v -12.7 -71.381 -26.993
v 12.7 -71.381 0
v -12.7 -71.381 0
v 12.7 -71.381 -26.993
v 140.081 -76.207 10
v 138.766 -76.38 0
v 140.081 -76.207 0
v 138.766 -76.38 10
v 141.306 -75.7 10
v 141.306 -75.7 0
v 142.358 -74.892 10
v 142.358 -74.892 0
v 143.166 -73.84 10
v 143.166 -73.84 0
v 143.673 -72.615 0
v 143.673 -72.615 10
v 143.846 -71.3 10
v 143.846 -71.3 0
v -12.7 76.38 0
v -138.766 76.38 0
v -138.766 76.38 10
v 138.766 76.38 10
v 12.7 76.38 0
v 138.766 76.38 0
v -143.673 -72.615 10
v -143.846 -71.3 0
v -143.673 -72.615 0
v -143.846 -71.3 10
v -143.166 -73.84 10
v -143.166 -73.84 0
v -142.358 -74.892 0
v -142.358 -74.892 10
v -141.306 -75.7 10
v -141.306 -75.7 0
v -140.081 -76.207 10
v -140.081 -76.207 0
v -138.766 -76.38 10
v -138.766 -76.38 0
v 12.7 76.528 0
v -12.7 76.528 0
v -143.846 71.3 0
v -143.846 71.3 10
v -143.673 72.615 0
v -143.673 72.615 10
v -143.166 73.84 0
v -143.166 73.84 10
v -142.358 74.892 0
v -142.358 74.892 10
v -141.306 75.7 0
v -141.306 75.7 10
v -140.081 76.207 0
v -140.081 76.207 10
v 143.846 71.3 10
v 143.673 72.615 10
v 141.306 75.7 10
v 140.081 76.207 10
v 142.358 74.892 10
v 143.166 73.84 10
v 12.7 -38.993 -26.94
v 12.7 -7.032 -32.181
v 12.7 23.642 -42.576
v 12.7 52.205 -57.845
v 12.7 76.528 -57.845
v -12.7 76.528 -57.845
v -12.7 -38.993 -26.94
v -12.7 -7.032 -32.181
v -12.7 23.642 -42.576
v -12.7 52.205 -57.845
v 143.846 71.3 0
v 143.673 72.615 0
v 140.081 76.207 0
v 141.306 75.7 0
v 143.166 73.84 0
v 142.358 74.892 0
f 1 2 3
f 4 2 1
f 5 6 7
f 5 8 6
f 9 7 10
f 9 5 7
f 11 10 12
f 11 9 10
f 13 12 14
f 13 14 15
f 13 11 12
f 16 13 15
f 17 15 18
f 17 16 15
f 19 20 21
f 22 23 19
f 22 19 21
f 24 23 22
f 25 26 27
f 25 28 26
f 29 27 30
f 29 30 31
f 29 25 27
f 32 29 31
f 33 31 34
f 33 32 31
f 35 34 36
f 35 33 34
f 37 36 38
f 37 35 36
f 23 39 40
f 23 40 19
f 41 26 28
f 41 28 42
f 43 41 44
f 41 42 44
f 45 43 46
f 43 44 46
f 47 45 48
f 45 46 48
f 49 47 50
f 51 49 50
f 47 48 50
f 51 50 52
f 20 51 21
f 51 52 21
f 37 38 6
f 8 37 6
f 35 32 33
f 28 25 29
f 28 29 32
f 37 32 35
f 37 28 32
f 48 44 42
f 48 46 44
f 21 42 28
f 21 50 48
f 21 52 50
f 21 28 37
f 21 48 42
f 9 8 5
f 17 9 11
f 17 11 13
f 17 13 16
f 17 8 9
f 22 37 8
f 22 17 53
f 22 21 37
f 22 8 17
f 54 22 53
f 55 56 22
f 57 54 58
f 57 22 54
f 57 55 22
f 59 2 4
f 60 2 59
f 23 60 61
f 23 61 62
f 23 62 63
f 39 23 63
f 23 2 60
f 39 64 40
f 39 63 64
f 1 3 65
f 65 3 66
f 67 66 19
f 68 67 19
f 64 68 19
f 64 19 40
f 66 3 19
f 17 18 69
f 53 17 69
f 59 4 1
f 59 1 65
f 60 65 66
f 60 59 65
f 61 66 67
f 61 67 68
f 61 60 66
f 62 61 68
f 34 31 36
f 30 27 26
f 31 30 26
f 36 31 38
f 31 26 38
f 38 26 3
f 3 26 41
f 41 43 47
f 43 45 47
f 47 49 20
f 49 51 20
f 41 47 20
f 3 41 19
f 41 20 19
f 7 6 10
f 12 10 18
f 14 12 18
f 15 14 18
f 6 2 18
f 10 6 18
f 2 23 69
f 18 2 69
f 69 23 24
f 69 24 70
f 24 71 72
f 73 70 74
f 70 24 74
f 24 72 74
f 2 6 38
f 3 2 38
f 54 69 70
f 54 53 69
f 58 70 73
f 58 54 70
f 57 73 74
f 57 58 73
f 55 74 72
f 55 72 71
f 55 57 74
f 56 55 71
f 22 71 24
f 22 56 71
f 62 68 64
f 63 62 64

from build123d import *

# Parameters (mm, degrees)
F0_W     = 287.692204
F0_H     = 152.760788
F1_DEPTH = 10
F2_R     = 5.08
F4_DEPTH = 12.7


with BuildPart() as f1:
    # F0 (on Top) → F1 (new body)
    with BuildSketch(Plane.XY):
        Rectangle(F0_W, F0_H)
    extrude(amount=F1_DEPTH)

    # F2
    f2_edges = [f1.edges().sort_by_distance(p)[0] for p in [
        (143.846102, -76.380394, 5),
        (-143.846102, 76.380394, 5),
        (-143.846102, -76.380394, 5),
        (143.846102, 76.380394, 5),
    ]]
    fillet(f2_edges, radius=F2_R)

    # F3 (on Right) → F4 (join, symmetric)
    with BuildSketch(Plane.YZ):
        with BuildLine():
            Line((76.528475, 0), (0, 0))
            Line((0, 0), (-71.380883, 0))
            Line((-71.380883, 0), (-71.380883, -26.993327))
            ThreePointArc((-71.380883, -26.993327), (-7.032306, -32.181445), (52.20481, -57.845037))
            Line((52.20481, -57.845037), (76.528475, -57.845037))
            Line((76.528475, -57.845037), (76.528475, 0))
        make_face()
    extrude(amount=F4_DEPTH, both=True)


solid = f1.part
